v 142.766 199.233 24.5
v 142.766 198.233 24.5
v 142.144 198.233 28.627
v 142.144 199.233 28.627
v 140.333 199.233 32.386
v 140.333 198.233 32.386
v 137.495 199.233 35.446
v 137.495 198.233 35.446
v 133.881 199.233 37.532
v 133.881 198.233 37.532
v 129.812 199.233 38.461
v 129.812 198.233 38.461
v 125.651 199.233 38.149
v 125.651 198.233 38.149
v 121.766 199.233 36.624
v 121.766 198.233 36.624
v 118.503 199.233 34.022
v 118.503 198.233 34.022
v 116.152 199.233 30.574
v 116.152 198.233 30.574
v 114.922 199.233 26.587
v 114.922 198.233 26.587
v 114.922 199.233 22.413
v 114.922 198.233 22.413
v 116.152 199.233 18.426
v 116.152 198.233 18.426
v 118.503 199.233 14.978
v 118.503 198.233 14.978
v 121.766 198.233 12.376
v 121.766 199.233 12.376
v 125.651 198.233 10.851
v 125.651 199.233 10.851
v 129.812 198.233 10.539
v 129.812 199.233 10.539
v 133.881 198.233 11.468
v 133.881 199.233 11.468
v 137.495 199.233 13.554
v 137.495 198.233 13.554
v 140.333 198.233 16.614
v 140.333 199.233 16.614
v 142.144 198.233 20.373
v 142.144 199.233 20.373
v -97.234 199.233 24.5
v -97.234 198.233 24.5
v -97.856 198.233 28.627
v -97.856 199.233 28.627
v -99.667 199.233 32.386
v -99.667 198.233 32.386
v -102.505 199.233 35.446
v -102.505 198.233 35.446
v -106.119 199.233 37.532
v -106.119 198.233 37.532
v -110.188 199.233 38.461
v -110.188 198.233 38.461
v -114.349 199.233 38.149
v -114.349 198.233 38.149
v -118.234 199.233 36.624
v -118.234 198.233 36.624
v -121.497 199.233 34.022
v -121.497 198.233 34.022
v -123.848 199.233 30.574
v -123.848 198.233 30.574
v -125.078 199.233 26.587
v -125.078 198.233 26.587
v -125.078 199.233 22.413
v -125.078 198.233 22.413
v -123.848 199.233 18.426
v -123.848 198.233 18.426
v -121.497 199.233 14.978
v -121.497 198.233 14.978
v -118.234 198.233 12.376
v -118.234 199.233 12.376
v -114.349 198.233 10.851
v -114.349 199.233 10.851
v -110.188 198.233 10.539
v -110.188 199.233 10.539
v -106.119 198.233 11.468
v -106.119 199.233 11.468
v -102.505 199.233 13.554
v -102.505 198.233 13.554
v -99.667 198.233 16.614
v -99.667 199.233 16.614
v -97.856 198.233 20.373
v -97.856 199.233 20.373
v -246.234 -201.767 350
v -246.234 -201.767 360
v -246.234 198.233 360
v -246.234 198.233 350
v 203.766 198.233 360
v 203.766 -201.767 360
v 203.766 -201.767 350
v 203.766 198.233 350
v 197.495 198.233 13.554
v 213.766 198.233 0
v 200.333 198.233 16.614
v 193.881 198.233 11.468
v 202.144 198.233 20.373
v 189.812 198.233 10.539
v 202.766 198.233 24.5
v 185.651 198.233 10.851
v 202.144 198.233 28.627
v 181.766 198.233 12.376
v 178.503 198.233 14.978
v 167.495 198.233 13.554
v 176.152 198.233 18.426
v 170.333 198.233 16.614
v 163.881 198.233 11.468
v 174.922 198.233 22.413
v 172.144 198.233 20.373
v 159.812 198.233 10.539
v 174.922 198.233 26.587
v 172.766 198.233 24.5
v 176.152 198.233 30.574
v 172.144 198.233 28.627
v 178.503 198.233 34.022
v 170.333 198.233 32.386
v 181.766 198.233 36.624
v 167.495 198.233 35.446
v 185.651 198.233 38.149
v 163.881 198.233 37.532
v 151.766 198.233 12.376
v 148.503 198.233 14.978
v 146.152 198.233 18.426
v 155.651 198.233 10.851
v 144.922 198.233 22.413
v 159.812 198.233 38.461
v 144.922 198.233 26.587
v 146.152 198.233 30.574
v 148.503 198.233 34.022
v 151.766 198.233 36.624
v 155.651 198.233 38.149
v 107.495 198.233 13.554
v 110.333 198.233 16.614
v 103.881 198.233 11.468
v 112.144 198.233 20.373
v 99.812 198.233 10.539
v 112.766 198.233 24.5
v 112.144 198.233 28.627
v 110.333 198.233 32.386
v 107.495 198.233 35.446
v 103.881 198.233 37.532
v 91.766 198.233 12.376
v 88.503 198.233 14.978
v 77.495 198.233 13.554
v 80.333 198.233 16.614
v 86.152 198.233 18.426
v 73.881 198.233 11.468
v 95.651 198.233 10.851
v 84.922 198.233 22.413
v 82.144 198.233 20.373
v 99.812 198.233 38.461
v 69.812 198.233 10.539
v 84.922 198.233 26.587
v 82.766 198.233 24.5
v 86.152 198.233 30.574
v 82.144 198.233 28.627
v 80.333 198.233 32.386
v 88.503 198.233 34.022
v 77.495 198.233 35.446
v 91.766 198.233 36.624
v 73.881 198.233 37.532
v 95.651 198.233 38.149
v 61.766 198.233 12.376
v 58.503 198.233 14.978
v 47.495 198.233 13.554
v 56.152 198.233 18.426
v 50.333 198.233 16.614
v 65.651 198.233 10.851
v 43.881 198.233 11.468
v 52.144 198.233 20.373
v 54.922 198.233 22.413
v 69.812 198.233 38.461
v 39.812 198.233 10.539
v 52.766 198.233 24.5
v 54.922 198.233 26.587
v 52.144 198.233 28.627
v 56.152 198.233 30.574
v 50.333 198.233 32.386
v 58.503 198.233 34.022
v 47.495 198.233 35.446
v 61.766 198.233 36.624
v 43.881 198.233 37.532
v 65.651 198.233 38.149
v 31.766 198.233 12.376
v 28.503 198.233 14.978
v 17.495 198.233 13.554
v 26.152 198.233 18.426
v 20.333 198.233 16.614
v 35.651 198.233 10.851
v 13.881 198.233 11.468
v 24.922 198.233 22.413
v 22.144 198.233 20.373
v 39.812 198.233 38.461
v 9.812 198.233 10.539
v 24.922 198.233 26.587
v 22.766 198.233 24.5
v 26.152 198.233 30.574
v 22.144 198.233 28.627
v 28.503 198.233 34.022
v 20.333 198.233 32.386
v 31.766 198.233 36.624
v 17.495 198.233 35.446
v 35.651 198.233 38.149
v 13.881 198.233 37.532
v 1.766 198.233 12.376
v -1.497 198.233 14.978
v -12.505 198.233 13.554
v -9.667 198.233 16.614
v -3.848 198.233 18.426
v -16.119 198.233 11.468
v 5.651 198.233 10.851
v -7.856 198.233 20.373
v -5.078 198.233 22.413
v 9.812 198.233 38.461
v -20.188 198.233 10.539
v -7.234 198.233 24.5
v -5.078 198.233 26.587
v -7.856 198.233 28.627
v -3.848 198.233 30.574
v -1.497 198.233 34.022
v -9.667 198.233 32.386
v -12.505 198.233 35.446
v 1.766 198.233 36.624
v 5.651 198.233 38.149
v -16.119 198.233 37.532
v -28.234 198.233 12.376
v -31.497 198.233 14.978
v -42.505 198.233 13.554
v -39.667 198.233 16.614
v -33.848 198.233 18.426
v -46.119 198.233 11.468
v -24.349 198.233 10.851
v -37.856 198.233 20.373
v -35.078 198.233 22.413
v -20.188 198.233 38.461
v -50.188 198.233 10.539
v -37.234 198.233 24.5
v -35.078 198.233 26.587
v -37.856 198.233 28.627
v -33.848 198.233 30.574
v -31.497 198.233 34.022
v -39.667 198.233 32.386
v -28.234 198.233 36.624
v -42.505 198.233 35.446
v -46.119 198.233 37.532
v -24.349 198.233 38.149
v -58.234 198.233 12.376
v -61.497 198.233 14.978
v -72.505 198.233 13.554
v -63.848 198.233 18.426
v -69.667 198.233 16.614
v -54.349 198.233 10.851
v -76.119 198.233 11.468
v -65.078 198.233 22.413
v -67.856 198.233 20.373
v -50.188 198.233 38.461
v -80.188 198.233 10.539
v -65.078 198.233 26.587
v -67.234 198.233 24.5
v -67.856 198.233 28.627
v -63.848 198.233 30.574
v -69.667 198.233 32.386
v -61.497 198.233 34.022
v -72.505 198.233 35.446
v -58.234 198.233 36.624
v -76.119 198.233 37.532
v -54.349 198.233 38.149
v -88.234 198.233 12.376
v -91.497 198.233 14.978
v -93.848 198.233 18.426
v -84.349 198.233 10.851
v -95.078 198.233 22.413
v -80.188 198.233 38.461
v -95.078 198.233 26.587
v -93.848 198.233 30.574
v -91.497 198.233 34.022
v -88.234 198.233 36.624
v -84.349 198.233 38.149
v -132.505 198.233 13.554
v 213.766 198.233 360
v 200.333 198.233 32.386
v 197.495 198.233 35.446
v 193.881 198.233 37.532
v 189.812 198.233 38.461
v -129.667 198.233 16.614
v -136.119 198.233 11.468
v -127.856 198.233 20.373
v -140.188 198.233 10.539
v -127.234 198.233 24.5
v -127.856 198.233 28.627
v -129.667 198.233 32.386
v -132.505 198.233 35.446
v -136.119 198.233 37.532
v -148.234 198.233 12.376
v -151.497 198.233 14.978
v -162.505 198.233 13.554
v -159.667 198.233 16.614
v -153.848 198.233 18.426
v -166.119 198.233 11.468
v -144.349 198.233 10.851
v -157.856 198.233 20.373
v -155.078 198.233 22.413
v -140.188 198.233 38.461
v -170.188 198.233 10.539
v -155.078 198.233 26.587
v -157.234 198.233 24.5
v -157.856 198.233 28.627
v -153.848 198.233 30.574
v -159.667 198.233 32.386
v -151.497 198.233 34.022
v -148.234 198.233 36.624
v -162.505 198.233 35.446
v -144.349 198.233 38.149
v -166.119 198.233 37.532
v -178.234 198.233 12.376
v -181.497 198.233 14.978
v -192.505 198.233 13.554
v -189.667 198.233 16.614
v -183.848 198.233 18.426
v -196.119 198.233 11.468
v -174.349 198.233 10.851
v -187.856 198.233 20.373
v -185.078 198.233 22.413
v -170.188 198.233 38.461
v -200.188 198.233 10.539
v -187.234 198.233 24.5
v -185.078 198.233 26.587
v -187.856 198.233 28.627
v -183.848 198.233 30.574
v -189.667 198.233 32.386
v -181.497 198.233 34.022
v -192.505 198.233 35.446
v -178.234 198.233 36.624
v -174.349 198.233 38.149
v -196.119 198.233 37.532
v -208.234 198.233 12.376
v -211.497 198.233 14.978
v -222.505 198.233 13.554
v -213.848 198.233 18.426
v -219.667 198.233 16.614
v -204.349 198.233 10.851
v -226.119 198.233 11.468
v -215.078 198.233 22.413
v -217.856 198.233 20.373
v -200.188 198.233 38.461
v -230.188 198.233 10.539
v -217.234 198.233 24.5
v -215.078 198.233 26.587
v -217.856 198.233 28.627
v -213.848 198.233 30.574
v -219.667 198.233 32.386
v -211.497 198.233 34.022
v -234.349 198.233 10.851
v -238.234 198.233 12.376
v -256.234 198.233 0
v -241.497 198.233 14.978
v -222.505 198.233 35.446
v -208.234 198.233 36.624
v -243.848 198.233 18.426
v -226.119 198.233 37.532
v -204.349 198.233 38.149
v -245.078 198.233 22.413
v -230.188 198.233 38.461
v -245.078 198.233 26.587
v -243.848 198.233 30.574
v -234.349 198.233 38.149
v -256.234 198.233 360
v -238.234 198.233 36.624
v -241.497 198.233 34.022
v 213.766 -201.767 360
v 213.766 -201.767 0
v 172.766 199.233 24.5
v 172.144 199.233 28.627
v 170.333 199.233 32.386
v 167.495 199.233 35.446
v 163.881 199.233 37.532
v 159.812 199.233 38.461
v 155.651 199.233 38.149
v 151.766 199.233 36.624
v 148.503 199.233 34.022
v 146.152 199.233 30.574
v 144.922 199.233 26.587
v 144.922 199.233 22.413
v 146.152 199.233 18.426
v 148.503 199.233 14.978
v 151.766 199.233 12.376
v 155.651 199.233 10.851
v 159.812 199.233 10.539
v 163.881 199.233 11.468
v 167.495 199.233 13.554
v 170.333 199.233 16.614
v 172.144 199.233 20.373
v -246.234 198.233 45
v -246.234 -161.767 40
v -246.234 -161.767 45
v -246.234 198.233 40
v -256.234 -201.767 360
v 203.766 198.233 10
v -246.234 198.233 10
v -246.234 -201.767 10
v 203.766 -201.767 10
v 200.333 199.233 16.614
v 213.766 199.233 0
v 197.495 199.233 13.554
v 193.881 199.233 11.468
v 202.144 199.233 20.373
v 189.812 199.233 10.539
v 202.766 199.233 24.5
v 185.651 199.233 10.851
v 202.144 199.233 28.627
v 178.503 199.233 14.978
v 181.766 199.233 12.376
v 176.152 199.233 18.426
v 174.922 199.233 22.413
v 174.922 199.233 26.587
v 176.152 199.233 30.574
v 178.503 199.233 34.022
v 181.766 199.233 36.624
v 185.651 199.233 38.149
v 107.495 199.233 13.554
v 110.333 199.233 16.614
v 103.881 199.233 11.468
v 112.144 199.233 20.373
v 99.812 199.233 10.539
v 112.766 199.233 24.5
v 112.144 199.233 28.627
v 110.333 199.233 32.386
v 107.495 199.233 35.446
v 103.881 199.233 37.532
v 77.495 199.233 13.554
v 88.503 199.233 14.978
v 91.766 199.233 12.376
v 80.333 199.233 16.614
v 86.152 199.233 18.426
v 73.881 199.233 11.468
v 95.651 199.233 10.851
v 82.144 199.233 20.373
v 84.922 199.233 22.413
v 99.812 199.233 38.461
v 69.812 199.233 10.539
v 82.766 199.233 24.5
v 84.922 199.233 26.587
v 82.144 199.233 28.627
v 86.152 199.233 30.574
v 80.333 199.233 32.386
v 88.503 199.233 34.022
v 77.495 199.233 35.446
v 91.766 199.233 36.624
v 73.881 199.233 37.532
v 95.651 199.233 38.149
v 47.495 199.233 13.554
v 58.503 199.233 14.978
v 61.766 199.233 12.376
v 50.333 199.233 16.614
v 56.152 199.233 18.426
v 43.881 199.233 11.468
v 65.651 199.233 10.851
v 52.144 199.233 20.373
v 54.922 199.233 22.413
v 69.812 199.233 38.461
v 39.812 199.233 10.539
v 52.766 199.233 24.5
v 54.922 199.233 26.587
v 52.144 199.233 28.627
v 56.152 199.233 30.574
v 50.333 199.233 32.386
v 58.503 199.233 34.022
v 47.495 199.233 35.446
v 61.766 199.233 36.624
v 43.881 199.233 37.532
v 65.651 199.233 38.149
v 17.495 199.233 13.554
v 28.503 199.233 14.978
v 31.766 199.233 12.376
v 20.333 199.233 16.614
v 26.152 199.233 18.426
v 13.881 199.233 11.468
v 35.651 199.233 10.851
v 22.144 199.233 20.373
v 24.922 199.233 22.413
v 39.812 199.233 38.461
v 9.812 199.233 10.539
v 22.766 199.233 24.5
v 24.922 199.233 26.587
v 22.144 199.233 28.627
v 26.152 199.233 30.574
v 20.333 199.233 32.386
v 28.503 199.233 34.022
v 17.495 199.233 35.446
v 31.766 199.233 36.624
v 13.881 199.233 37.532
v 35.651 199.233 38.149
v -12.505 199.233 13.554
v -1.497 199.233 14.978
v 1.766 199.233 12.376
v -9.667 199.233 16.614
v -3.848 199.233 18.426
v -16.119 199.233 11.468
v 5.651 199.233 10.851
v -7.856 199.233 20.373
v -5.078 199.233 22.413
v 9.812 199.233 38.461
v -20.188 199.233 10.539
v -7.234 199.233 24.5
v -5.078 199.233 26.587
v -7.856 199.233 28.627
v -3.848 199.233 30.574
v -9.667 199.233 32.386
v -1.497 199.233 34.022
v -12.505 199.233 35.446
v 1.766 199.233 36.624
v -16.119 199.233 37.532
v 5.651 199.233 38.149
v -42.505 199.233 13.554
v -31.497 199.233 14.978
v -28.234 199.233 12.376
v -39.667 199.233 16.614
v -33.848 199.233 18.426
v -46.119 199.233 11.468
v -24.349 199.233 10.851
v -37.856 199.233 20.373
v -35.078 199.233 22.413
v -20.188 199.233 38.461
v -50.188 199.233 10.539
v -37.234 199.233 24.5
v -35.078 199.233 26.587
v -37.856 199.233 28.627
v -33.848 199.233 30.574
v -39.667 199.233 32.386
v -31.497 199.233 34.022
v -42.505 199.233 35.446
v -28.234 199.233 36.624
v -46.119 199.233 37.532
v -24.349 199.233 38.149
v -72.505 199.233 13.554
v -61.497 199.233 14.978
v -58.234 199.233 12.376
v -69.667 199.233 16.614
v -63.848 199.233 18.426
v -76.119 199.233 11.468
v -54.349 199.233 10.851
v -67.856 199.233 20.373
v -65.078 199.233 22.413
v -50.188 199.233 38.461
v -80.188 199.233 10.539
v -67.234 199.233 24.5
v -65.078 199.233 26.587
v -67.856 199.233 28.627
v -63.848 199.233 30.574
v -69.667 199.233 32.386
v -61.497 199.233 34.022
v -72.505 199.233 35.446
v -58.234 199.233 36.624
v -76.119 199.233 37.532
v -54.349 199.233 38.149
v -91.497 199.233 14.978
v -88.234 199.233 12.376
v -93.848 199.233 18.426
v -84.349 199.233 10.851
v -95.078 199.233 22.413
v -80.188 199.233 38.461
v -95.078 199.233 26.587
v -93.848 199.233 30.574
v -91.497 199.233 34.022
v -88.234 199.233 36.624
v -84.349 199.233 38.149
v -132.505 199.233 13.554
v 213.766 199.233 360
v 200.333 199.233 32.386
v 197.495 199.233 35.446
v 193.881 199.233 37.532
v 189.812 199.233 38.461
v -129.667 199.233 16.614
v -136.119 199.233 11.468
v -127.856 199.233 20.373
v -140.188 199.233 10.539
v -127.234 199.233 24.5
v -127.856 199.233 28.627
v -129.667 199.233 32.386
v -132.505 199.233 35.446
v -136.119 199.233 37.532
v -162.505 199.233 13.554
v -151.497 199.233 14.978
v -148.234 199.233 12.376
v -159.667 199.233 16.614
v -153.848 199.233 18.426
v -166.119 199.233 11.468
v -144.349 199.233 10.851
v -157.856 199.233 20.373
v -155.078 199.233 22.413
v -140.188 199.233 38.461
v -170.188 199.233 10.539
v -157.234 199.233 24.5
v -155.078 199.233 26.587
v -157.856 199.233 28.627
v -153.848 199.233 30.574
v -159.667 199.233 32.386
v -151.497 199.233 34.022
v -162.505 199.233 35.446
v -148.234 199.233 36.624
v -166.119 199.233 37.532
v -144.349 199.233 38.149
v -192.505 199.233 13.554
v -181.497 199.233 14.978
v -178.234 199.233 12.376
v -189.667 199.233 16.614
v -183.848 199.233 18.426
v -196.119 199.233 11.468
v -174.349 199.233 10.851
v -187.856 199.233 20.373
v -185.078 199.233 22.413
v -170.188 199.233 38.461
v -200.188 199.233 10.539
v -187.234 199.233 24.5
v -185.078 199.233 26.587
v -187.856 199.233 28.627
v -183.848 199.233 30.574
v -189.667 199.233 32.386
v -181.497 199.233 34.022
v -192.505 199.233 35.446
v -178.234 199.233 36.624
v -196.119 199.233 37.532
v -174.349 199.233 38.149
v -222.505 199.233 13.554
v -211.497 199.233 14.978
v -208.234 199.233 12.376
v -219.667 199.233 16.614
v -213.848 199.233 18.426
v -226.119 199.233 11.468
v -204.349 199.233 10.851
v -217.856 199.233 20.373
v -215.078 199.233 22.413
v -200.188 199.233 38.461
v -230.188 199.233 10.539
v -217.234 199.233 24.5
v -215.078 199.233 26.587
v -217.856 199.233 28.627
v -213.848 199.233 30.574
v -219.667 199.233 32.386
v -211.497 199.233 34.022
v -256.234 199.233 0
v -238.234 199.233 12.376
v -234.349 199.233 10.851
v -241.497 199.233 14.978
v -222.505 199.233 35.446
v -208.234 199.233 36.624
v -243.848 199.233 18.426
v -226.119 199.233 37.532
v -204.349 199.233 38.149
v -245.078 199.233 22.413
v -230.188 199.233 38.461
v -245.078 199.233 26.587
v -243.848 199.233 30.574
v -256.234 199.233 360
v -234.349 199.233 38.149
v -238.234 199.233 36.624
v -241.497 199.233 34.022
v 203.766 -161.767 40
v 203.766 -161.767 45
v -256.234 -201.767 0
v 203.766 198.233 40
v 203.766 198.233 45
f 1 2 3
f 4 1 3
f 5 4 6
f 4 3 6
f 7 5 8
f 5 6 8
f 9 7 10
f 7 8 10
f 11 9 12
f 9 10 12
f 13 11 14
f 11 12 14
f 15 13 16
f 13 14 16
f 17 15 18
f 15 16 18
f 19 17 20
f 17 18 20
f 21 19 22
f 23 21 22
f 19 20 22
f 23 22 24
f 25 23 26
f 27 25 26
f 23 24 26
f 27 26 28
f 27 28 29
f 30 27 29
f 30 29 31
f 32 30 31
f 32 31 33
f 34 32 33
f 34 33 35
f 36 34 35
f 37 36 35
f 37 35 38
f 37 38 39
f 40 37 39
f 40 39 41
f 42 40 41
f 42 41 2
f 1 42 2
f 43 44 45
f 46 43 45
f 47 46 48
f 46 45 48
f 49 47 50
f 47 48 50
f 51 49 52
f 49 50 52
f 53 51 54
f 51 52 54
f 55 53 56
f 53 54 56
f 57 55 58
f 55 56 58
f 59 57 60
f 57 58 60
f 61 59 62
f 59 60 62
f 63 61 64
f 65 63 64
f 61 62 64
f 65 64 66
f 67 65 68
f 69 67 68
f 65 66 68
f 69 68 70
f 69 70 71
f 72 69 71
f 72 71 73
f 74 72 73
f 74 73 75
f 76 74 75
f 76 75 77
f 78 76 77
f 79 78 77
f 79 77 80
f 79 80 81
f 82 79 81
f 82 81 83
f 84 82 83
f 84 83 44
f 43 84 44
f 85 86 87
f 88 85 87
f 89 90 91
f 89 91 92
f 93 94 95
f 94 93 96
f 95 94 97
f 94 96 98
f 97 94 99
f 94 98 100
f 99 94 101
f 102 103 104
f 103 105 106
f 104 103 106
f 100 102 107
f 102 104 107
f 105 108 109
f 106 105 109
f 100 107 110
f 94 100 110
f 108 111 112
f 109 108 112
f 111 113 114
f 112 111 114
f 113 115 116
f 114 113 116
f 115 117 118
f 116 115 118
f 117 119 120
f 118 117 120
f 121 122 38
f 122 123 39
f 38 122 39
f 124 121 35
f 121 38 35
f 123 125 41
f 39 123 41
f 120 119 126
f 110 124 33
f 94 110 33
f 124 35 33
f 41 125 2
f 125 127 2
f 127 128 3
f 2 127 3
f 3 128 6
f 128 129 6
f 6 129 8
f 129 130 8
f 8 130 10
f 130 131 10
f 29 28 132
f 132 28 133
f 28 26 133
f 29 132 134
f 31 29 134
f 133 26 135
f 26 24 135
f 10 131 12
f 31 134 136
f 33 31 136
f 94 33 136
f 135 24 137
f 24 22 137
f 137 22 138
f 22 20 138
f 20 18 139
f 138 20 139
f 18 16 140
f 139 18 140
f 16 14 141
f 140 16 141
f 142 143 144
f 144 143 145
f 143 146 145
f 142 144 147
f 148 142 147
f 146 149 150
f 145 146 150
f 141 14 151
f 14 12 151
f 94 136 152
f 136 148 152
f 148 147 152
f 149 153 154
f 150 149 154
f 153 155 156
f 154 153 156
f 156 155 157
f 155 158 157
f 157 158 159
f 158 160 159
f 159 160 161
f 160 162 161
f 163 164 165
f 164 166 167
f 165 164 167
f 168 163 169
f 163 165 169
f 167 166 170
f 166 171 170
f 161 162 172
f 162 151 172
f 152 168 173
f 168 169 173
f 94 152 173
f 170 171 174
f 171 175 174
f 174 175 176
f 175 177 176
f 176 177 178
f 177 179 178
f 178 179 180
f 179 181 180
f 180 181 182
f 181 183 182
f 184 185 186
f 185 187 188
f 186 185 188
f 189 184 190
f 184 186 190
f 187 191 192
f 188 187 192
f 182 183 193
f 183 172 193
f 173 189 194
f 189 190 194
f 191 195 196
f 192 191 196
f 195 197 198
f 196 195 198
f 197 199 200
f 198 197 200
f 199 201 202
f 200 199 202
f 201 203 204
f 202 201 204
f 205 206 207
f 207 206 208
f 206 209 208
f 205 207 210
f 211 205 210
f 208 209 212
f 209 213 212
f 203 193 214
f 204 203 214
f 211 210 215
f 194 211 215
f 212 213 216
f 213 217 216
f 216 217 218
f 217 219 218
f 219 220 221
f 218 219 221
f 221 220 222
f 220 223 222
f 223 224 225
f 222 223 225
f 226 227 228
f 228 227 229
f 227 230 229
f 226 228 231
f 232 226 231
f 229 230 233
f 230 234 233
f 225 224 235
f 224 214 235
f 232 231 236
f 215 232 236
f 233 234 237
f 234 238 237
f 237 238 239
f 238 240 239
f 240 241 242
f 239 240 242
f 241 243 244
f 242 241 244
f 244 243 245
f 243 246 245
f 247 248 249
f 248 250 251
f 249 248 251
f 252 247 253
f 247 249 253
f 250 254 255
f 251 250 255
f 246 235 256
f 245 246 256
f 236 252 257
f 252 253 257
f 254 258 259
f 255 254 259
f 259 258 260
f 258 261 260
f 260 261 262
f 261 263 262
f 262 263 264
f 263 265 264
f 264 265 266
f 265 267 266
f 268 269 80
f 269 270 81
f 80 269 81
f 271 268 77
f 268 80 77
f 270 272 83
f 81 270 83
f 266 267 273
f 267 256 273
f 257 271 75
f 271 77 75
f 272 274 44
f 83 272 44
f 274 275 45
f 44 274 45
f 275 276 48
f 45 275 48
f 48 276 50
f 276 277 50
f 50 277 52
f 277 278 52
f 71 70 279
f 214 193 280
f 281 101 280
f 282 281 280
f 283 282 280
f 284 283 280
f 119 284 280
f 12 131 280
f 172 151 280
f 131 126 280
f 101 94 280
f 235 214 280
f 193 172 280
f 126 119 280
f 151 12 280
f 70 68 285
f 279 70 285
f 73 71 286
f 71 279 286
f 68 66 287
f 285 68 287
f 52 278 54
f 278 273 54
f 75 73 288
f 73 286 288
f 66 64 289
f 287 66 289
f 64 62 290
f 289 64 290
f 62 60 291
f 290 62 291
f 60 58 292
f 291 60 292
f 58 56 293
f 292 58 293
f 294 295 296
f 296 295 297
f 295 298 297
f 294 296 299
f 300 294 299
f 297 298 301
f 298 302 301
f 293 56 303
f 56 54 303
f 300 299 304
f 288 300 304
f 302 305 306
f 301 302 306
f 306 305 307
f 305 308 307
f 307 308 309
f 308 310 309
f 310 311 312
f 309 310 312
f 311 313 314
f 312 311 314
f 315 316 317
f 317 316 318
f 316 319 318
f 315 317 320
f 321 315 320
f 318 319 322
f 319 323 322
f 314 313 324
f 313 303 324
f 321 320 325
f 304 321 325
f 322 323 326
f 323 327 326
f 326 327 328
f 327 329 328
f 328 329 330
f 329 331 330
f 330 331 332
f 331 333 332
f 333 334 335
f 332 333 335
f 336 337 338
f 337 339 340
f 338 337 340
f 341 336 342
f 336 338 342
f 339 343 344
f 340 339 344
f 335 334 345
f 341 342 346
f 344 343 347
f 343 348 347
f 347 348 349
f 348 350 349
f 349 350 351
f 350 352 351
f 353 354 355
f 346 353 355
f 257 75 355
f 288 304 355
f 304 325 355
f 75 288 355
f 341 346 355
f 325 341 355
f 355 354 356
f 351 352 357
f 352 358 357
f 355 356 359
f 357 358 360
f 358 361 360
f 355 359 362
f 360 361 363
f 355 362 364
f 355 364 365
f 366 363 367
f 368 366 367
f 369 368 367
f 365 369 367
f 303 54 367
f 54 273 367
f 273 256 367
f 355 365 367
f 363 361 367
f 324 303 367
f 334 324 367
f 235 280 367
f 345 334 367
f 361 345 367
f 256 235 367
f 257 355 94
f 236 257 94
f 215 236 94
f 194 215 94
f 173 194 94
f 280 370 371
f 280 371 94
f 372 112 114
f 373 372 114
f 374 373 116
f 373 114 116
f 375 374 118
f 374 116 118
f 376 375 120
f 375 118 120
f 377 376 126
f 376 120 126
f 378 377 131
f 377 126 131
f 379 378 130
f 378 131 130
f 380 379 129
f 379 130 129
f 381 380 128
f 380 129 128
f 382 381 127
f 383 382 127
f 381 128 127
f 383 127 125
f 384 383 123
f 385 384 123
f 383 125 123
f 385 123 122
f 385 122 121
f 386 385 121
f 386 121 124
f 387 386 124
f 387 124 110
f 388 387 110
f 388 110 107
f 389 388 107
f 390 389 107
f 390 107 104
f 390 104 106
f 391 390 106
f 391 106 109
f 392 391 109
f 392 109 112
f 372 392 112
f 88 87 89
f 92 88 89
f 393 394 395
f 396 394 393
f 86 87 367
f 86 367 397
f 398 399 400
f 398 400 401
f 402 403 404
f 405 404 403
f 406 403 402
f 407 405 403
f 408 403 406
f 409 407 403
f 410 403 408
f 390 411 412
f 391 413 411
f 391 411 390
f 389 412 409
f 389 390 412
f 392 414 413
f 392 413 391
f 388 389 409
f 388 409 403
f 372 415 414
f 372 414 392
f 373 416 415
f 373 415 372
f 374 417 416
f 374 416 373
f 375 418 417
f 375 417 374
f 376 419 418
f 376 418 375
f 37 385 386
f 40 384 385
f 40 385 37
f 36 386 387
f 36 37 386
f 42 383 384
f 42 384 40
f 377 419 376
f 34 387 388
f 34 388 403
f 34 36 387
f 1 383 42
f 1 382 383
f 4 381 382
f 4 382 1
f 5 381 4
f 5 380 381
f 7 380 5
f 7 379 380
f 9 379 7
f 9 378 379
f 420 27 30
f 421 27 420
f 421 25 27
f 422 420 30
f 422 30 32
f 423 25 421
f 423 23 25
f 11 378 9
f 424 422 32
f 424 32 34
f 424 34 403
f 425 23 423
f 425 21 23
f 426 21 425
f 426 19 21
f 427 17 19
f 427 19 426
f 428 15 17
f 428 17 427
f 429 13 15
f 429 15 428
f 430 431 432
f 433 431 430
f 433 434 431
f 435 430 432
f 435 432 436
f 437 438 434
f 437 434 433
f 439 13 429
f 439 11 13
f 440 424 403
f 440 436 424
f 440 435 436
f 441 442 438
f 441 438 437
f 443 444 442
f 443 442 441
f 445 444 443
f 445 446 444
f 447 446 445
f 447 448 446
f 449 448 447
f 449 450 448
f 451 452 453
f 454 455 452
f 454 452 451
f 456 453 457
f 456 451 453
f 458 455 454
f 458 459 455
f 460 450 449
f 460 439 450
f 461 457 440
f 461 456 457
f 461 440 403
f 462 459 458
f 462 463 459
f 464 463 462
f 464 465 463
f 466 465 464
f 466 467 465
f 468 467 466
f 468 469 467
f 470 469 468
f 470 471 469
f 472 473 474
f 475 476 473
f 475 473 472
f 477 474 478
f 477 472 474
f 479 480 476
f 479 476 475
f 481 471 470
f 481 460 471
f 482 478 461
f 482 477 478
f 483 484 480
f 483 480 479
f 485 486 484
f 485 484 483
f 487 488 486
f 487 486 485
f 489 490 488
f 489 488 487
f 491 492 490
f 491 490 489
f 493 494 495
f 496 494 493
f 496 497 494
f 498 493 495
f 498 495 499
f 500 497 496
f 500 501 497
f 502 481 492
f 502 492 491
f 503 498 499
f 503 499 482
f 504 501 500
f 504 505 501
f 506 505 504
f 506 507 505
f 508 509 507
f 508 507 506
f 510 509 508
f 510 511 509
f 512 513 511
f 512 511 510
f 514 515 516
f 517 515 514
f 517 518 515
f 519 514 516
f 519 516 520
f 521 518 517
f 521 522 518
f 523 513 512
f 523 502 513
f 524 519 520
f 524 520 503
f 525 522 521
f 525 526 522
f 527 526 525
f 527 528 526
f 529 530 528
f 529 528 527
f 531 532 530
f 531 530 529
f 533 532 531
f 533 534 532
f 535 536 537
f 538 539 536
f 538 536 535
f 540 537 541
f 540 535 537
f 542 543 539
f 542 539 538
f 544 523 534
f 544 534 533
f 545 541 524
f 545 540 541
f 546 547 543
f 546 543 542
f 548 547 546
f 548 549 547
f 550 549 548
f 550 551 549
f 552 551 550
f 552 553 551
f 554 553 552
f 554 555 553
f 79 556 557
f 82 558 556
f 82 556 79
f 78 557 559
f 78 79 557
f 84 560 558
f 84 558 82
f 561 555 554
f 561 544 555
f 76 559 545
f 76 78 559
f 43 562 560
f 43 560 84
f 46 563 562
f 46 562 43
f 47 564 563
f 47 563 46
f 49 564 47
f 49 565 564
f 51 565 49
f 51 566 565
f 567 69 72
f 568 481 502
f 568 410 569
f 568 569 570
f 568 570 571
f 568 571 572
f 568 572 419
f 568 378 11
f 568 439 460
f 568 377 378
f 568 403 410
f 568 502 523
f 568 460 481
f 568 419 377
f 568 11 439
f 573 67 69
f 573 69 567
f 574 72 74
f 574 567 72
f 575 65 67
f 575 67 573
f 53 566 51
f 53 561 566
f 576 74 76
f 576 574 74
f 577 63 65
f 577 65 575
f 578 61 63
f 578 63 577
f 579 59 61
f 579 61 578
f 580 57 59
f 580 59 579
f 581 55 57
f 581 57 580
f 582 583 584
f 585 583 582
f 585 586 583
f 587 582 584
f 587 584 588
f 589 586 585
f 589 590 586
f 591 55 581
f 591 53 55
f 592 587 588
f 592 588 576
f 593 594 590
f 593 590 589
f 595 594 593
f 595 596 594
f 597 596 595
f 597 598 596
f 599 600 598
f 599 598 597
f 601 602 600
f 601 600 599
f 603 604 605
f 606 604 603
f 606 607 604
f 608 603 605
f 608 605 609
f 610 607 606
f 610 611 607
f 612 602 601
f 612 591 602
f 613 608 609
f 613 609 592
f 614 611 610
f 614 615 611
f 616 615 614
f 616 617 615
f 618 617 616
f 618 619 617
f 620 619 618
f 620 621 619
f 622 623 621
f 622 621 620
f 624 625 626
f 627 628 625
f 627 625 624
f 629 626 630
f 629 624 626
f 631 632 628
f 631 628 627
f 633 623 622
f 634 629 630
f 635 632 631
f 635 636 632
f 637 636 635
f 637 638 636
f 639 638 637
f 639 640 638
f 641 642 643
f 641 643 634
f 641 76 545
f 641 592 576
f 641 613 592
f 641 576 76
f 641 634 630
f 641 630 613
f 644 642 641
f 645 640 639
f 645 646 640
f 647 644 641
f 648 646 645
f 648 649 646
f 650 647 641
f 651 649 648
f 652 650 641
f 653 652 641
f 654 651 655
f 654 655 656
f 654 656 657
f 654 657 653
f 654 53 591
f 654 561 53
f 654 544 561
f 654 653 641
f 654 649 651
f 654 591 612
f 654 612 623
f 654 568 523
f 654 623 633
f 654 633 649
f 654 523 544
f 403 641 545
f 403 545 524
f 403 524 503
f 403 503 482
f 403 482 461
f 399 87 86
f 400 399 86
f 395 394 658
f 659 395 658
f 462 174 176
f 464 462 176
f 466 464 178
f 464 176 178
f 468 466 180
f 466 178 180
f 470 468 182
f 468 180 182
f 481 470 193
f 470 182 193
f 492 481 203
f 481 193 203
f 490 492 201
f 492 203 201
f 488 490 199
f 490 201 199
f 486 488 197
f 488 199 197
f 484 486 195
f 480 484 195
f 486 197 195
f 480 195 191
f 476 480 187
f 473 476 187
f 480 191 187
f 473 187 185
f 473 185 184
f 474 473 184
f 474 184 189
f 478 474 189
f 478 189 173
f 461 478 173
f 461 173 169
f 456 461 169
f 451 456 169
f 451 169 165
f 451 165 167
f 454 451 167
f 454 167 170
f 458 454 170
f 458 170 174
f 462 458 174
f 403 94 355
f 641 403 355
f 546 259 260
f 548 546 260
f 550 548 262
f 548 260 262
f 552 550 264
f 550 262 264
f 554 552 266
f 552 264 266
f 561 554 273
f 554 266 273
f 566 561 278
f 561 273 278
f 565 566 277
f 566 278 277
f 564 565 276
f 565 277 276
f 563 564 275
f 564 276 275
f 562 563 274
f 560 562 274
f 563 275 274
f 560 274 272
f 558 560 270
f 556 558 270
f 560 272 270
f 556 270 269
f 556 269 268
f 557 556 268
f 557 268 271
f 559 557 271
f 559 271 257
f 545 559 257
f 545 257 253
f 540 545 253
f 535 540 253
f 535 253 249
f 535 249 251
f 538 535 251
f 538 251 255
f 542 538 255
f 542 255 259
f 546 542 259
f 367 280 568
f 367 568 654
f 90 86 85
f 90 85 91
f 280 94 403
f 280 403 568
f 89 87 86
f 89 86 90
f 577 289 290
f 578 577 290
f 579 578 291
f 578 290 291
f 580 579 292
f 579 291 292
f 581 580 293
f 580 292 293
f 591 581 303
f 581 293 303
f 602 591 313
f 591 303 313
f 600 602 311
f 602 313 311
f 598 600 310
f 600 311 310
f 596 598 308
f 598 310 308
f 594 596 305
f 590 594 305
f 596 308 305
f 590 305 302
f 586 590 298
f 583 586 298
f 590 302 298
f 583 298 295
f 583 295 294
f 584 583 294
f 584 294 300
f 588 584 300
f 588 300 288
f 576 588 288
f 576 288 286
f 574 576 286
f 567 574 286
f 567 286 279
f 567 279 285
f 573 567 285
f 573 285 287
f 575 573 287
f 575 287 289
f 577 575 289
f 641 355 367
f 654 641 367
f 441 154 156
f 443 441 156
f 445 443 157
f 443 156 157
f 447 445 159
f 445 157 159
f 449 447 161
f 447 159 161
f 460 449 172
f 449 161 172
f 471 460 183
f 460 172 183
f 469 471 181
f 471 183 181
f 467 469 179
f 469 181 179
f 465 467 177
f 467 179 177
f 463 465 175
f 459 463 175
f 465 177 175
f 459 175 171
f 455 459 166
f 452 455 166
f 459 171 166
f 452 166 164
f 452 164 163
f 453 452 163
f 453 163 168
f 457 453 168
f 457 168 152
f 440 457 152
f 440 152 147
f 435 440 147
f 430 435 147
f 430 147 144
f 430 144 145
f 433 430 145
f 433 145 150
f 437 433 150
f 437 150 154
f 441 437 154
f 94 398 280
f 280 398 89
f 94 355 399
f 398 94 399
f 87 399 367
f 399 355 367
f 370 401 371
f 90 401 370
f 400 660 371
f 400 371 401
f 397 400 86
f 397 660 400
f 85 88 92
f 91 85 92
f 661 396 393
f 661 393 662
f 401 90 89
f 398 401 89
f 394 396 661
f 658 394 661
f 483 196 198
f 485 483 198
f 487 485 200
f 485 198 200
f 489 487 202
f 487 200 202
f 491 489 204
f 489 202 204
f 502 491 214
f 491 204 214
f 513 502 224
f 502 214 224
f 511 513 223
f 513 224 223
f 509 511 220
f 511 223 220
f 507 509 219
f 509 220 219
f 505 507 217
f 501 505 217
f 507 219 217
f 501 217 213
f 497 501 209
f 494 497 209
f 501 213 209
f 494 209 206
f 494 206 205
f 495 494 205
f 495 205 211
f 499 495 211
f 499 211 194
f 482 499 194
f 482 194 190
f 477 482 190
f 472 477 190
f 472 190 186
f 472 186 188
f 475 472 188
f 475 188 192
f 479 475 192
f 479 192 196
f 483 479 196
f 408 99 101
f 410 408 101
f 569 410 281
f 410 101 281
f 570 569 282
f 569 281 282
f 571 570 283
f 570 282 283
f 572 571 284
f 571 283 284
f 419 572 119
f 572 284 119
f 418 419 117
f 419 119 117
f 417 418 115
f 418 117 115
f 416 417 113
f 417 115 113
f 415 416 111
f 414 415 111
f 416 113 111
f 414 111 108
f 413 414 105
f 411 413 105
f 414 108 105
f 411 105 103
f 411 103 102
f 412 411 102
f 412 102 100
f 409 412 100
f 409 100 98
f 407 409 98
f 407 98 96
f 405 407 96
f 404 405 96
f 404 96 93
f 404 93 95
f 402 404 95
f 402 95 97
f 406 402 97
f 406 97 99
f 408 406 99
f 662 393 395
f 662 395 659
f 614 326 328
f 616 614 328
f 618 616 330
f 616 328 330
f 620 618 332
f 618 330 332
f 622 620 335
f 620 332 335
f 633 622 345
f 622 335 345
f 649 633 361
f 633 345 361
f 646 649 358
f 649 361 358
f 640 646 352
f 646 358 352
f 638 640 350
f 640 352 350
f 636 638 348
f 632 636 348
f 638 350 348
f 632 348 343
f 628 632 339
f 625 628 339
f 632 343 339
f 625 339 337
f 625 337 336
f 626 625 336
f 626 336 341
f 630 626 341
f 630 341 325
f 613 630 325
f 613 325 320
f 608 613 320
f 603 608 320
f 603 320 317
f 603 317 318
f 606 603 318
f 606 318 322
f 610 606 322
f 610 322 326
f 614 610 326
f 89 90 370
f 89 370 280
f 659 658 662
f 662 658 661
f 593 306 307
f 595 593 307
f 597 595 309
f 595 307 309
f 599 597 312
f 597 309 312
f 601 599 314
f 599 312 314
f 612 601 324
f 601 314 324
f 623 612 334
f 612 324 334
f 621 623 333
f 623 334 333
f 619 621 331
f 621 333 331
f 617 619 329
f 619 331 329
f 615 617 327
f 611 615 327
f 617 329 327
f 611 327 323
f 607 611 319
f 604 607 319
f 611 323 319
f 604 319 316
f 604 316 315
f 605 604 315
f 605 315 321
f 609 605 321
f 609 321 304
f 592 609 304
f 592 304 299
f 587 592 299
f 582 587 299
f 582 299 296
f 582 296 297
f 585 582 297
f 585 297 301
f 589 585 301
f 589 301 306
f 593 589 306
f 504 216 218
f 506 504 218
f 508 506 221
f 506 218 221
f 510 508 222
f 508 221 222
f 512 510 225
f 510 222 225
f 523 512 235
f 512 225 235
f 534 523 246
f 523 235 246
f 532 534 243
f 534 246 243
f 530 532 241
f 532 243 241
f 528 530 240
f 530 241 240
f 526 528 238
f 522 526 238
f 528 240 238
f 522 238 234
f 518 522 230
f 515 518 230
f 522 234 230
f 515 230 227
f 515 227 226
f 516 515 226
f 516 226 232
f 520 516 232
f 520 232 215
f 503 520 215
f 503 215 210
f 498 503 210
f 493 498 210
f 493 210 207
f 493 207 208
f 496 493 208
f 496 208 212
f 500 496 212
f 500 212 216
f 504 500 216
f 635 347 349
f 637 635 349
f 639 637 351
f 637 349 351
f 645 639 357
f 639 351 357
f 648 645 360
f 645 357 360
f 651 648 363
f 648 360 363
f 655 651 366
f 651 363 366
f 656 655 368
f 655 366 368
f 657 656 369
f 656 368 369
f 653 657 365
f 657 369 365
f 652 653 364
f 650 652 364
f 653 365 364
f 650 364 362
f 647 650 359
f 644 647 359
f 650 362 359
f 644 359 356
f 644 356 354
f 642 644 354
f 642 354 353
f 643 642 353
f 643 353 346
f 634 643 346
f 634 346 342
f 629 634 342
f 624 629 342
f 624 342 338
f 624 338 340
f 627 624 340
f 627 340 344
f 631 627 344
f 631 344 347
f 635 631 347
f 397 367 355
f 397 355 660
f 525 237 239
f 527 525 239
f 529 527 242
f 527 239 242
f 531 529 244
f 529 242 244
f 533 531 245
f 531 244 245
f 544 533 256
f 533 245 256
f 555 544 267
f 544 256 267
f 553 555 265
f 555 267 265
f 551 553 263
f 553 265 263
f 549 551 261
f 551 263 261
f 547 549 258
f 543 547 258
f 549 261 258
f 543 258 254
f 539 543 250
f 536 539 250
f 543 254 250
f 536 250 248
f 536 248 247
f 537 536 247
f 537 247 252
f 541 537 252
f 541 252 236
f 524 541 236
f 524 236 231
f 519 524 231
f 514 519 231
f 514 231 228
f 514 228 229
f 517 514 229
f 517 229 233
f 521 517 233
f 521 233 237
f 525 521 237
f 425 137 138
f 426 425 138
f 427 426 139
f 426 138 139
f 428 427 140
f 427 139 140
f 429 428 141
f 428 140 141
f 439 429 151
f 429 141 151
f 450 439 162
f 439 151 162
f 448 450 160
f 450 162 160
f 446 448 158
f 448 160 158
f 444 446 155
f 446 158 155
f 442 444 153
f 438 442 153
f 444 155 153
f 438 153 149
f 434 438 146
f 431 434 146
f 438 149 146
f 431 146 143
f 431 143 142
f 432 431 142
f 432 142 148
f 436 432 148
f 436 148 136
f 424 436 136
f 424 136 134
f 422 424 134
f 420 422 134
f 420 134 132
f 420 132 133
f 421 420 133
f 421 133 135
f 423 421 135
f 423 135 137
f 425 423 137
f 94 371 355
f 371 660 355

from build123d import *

# Parameters (mm, degrees)
F0_W      = 450
F0_H      = 400
F1_DEPTH  = 10
F5_W      = 340.3431326151
F5_H      = 72.7730989456
F6_DEPTH  = 10
F7_W      = 400
F7_H      = 360
F8_DEPTH  = 10
F9_W      = 400
F9_H      = 360
F10_DEPTH = 10
F12_W     = 450
F12_H     = 400
F13_DEPTH = 10
F14_W     = 470
F14_H     = 360
F15_DEPTH = 1
F17_W     = 450
F17_H     = 360
F18_DEPTH = 5
F20_D     = 28


with BuildPart() as f1:
    # F0 (on Top) → F1 (new body)
    with BuildSketch(Plane.XY):
        with Locations((-21.2339609861, -1.7666330037)):
            Rectangle(F0_W, F0_H)
    extrude(amount=F1_DEPTH)

    # F5 (on offset) → F6 (join)
    with BuildSketch(Plane(origin=(-246.2339609861, 0, 0), x_dir=(0, -1, 0), z_dir=(-1, 0, 0))):
        with Locations((-9.1566815972, 36.3865494728)):
            Rectangle(F5_W, F5_H)
    extrude(amount=F6_DEPTH)

    # F7 (on offset) → F8 (join)
    with BuildSketch(Plane(origin=(-246.2339609861, 0, 0), x_dir=(0, -1, 0), z_dir=(-1, 0, 0))):
        with Locations((1.7666330037, 180)):
            Rectangle(F7_W, F7_H)
    extrude(amount=F8_DEPTH)

    # F9 (on offset) → F10 (join)
    with BuildSketch(Plane.YZ.offset(203.7660390139)):
        with Locations((-1.7666330037, 180)):
            Rectangle(F9_W, F9_H)
    extrude(amount=F10_DEPTH)


with BuildPart() as f13:
    # F12 (on offset) → F13 (new body)
    with BuildSketch(Plane.XY.offset(360)):
        with Locations((-21.2339609861, -1.7666330037)):
            Rectangle(F12_W, F12_H)
    extrude(amount=-F13_DEPTH)


with BuildPart() as f15:
    # F14 (on offset) → F15 (new body)
    with BuildSketch(Plane(origin=(0, 198.2333669963, 0), x_dir=(-1, 0, 0), z_dir=(0, 1, 0))):
        with Locations((21.2339609861, 180)):
            Rectangle(F14_W, F14_H)
    extrude(amount=F15_DEPTH)

    # F20 (through all)
    with Locations(Plane(origin=(0, 199.2333669963, 0), x_dir=(-1, 0, 0), z_dir=(0, 1, 0))):
        with Locations((-188.7660390139, 24.5), (-158.7660390139, 24.5), (-128.7660390139, 24.5), (-98.7660390139, 24.5), (-68.7660390139, 24.5), (-38.7660390139, 24.5), (-8.7660390139, 24.5), (21.2339609861, 24.5), (51.2339609861, 24.5), (81.2339609861, 24.5), (111.2339609861, 24.5), (141.2339609861, 24.5), (171.2339609861, 24.5), (201.2339609861, 24.5), (231.2339609861, 24.5)):
            Hole(F20_D / 2)


with BuildPart() as f18:
    # F17 (on offset) → F18 (new body)
    with BuildSketch(Plane.XY.offset(40)):
        with Locations((-21.2339609861, 18.2333669963)):
            Rectangle(F17_W, F17_H)
    extrude(amount=F18_DEPTH)


solid = Compound([f1.part, f13.part, f15.part, f18.part])
